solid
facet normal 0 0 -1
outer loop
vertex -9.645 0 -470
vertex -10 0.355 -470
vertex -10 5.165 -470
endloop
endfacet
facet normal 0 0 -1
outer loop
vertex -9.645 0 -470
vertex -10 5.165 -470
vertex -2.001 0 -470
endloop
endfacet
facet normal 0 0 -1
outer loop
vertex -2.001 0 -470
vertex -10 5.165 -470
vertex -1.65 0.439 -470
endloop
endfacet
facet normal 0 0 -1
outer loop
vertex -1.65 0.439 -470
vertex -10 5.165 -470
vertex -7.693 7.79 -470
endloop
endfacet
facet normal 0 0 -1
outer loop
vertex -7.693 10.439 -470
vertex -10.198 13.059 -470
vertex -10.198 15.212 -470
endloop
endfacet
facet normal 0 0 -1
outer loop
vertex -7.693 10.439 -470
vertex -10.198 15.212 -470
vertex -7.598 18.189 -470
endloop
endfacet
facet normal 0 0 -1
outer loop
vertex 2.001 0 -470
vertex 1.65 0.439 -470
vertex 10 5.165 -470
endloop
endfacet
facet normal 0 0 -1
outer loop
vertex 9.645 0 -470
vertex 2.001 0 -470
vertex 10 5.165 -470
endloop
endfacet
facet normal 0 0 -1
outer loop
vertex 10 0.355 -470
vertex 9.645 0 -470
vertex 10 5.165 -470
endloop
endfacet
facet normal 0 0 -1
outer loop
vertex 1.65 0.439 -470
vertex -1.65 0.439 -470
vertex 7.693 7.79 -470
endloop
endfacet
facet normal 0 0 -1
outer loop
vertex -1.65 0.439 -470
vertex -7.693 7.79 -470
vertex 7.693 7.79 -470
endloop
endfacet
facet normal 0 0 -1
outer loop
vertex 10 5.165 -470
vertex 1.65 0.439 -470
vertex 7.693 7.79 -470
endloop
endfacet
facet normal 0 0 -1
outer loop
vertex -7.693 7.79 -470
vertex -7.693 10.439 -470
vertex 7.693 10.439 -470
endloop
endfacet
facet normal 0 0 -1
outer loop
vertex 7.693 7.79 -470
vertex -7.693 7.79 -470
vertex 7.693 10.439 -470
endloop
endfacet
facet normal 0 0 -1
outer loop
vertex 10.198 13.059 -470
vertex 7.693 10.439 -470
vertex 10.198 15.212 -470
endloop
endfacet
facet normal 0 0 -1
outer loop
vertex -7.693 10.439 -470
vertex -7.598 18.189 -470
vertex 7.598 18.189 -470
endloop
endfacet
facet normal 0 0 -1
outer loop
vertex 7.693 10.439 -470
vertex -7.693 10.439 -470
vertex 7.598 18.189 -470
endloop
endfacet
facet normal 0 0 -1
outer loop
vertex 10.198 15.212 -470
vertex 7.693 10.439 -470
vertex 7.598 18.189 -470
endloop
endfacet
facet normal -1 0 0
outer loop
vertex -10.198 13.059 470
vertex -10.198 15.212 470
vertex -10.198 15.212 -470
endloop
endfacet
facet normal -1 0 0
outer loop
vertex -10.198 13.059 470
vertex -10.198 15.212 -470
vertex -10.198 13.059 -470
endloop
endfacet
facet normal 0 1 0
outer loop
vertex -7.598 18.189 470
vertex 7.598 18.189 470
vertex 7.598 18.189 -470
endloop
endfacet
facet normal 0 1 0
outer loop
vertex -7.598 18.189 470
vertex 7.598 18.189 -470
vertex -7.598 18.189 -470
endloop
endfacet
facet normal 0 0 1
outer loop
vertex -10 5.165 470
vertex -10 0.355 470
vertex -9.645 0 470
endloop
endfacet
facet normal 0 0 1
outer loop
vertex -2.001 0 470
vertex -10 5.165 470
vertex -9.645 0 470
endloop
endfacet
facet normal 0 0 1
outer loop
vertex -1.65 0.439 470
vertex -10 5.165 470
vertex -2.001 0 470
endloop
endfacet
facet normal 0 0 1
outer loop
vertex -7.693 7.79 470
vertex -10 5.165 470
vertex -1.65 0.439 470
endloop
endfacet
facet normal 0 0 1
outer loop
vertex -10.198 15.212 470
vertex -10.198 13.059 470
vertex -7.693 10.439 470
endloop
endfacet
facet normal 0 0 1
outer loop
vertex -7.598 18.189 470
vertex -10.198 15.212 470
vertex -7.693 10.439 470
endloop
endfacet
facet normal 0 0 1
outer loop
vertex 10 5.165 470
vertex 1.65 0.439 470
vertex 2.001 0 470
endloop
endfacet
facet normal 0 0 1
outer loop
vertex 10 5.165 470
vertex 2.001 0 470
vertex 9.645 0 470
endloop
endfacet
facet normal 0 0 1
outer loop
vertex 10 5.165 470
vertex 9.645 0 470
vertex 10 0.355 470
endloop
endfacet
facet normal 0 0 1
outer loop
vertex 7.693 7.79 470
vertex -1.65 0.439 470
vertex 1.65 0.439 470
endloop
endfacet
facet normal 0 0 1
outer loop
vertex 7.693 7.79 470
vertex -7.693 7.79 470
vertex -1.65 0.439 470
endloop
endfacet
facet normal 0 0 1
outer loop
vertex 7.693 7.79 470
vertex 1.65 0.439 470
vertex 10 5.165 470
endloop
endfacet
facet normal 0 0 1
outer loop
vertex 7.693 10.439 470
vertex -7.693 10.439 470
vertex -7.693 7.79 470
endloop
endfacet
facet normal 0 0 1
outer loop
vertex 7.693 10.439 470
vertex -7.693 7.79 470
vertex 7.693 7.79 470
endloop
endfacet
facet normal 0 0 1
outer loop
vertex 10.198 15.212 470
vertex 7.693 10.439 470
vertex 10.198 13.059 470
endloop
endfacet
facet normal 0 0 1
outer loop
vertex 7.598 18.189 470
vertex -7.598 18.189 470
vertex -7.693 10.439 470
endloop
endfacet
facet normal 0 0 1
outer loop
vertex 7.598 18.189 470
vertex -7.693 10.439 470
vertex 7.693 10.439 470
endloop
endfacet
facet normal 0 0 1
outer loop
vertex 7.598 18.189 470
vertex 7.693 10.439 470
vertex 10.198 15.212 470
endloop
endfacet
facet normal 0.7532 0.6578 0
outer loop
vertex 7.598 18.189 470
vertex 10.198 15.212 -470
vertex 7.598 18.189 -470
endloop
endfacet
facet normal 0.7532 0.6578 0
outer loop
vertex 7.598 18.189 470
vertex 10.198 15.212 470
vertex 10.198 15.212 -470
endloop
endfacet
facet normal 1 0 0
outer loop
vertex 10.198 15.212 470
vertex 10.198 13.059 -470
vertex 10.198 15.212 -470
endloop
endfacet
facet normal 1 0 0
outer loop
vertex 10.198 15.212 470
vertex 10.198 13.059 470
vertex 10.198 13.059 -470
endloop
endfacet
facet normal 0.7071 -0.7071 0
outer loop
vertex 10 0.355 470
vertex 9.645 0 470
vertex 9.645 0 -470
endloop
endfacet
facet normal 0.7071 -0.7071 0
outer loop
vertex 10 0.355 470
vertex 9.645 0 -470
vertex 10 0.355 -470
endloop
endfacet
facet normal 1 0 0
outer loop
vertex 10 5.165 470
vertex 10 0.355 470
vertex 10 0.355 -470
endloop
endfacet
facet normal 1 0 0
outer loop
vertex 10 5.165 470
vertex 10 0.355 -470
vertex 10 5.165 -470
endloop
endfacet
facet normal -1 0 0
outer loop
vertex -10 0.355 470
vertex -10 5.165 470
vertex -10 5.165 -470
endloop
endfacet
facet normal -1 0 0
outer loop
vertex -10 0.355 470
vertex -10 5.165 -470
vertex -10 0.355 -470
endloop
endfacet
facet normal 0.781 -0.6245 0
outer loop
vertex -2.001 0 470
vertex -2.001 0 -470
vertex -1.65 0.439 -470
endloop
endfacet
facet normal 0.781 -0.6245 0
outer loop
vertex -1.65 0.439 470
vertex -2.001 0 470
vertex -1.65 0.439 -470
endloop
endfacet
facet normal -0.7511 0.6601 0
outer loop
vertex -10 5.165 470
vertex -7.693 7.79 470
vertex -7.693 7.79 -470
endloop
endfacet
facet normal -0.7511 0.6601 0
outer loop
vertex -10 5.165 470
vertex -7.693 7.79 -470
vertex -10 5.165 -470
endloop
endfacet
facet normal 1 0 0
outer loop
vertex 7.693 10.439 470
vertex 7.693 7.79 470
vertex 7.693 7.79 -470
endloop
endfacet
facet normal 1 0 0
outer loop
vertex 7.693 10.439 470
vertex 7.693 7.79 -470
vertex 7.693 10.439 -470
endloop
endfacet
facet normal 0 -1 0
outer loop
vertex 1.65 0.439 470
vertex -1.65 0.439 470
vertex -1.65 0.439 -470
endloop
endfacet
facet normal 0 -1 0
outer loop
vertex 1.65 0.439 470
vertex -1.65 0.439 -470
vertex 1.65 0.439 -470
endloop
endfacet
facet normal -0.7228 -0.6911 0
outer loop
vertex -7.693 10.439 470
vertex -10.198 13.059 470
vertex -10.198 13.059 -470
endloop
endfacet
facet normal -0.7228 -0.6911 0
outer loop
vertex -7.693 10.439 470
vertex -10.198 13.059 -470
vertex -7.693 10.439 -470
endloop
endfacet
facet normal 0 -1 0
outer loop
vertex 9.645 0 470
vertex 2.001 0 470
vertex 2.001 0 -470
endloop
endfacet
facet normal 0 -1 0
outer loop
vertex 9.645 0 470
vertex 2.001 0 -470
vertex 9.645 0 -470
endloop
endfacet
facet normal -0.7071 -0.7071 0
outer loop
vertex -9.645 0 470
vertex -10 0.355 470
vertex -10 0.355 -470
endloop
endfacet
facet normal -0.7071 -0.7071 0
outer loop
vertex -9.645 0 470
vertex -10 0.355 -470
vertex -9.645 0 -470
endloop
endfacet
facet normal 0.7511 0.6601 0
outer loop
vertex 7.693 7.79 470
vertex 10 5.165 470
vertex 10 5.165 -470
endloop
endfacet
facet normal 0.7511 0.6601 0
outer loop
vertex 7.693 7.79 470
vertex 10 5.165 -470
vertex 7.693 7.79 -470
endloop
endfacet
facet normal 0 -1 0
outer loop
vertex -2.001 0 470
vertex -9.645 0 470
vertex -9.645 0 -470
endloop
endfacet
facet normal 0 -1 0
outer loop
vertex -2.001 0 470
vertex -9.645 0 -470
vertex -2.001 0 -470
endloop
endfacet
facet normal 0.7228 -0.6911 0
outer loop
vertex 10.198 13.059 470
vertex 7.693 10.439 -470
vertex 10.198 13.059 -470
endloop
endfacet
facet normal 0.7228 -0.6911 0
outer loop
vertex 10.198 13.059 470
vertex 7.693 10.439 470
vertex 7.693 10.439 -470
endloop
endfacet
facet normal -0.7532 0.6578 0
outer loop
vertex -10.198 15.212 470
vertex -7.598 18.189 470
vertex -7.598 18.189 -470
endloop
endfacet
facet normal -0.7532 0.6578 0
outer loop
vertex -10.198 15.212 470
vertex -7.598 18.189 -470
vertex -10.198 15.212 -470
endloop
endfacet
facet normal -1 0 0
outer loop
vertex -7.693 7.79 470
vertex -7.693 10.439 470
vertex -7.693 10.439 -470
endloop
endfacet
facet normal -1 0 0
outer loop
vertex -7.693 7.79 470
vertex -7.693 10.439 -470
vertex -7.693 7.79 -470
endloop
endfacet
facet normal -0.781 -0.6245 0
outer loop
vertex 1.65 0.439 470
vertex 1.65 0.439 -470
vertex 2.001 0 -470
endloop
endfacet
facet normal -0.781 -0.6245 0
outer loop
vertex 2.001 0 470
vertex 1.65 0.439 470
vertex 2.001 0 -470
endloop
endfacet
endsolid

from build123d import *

# Parameters (mm, degrees)
EXTRUDE_1_DEPTH = 470


with BuildPart() as part:
    # 草图1 → 凸台-拉伸1 (new, symmetric)
    with BuildSketch(Plane.XY):
        Polygon((10.198060517, 15.211712223), (7.598340067, 18.189433578), (0, 18.189433578), (-7.598466158, 18.189433578), (-10.198186608, 15.211712223), (-10.198186608, 13.058876879), (-7.692519459, 10.438572741), (-7.692519459, 7.789953693), (-10, 5.165156487), (-10, 5.000194017), (-10, 0.355272087), (-9.644727913, 0), (-2.000943933, 0), (-1.650125997, 0.439438875), (1.650125997, 0.439438875), (2.000943933, 0), (9.644727913, 0), (10, 0.355272087), (10, 5.00019402), (10, 5.165156487), (7.692519459, 7.789953693), (7.692519459, 10.438572741), (10.198186608, 13.058876879), align=None)
    extrude(amount=EXTRUDE_1_DEPTH, both=True)


solid = part.part
